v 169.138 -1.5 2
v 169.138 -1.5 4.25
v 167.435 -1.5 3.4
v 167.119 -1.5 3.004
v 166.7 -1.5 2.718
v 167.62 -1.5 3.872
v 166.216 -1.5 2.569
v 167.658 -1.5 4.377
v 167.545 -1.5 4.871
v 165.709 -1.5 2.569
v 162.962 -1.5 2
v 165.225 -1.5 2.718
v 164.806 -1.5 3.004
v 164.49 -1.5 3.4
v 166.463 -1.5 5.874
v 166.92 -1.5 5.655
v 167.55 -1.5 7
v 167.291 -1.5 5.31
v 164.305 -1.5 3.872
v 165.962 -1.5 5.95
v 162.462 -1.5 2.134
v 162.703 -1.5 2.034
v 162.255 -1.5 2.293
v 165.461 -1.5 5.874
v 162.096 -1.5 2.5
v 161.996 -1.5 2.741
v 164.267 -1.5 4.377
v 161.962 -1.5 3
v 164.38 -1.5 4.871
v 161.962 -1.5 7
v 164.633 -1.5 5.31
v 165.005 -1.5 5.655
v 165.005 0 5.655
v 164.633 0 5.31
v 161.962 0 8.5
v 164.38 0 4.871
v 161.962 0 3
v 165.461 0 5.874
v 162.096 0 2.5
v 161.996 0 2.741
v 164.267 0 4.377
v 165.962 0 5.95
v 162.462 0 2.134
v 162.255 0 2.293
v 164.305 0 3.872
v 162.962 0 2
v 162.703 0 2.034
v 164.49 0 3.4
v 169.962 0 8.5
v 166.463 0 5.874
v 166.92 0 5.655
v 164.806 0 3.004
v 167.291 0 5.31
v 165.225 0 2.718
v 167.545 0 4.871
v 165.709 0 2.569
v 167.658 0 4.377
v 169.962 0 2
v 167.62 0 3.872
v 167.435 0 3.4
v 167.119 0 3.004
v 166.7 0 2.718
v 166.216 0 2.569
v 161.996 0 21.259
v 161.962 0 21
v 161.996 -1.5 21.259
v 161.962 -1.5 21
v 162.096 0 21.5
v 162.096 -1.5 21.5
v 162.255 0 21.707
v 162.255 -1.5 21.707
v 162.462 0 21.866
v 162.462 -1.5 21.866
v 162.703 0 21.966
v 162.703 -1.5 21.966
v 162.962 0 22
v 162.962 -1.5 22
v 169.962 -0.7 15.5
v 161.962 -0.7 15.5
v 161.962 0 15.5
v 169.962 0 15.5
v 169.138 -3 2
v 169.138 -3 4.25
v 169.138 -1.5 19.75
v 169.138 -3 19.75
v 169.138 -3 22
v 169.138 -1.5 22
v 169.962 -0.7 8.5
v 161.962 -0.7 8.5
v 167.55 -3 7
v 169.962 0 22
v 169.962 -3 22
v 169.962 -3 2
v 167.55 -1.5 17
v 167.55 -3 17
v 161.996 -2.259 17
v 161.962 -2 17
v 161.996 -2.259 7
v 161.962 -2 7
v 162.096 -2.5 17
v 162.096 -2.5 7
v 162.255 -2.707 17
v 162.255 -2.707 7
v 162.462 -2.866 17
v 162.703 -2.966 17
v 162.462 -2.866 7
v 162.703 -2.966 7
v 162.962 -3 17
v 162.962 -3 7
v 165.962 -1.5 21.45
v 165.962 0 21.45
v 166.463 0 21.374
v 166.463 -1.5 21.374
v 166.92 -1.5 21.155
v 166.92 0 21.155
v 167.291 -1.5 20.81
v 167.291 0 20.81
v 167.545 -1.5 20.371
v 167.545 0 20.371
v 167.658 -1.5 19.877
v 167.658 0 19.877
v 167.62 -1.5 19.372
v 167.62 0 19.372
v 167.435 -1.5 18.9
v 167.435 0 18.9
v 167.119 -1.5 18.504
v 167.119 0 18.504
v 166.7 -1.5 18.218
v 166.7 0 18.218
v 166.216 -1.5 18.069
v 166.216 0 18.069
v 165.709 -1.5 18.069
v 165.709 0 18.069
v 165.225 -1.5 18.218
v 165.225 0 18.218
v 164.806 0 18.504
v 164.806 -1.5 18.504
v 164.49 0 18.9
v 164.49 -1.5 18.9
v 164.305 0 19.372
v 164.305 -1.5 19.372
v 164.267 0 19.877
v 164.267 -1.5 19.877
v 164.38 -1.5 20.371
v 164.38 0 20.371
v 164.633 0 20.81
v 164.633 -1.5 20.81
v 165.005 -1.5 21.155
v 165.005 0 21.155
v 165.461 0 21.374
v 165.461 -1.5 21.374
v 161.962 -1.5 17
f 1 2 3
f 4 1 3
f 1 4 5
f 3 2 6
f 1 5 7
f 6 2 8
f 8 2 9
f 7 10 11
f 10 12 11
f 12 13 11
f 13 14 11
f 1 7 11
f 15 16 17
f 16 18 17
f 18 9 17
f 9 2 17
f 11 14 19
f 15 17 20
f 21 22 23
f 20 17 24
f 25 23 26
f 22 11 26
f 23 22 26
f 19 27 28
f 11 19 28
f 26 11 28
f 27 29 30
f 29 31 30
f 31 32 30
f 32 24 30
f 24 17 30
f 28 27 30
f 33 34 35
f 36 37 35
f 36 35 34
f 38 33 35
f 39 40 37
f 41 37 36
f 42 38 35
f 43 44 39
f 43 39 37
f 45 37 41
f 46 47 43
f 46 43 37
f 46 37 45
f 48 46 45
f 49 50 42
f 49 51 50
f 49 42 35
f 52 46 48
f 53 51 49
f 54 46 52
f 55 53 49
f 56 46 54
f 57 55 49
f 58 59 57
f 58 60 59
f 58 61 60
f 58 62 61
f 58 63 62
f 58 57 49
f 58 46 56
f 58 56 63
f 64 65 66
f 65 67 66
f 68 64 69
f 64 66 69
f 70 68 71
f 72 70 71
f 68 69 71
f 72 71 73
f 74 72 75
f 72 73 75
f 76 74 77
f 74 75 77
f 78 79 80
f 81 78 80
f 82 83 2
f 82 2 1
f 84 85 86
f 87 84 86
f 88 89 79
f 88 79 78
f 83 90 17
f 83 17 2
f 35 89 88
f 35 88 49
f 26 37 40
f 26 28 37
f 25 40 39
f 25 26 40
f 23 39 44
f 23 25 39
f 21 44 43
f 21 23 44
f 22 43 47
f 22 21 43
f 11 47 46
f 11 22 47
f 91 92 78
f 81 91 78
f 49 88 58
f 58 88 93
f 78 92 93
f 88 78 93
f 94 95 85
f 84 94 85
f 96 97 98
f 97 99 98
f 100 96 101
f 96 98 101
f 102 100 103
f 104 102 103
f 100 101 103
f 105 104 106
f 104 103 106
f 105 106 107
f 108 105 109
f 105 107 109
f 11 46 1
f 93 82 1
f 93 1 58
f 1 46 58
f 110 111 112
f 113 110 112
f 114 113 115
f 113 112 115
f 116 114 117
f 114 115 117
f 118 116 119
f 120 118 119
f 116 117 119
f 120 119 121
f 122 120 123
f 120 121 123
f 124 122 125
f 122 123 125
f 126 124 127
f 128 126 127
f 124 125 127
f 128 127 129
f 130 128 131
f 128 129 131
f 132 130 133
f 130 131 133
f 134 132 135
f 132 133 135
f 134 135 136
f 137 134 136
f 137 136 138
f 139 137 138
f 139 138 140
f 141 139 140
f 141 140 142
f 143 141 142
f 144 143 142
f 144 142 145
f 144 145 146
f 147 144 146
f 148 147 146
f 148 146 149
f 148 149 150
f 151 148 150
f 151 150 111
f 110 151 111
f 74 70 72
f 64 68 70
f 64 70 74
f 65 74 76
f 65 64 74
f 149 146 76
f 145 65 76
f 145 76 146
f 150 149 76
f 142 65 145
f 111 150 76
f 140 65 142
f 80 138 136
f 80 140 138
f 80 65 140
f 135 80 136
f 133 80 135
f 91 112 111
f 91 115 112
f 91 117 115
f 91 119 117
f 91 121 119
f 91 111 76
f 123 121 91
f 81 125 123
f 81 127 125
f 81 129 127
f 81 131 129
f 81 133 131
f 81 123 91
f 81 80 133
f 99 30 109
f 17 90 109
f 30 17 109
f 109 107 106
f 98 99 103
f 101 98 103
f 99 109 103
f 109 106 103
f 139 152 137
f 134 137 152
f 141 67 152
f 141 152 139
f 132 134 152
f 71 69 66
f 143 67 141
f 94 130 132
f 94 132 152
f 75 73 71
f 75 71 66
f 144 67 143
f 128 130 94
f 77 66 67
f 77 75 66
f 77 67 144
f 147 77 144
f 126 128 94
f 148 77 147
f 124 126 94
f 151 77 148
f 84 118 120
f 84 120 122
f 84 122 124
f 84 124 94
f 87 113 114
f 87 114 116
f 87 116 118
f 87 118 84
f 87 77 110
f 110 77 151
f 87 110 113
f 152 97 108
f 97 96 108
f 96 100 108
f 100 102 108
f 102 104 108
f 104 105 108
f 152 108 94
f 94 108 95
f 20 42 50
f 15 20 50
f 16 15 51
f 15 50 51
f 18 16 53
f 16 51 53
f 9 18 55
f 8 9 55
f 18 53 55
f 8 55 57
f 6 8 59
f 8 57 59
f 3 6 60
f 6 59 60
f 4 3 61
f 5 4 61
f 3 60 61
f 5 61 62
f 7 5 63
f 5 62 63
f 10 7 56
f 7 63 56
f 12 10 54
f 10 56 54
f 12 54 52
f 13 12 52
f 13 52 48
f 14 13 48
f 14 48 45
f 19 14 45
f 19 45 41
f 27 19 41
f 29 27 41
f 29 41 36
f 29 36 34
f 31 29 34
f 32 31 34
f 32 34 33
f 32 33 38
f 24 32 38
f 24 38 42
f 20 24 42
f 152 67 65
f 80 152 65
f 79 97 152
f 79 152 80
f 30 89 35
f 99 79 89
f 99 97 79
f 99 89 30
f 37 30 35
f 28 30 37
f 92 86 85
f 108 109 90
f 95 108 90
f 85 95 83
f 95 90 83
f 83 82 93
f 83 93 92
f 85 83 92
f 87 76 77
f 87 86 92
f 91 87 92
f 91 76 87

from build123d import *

# Parameters (mm, degrees)
CROQUIS1_W              = 8
CROQUIS1_H              = 20
CROQUIS1_R              = 1.7
SALIENTE_EXTRUIR1_DEPTH = 3
CORTAR_EXTRUIR2_DEPTH   = 1.5
CORTAR_EXTRUIR3_REACH   = 25.601
CROQUIS3_W              = 7
CROQUIS3_H              = 1
REDONDEO1_R             = 1
CROQUIS4_W              = 8
CROQUIS4_H              = 7
SALIENTE_EXTRUIR2_DEPTH = 0.3


with BuildPart() as part:
    # Croquis1 → Saliente-Extruir1 (new body)
    with BuildSketch(Plane(origin=(0, 0, 0), x_dir=(1, 0, 0), z_dir=(0, 1, 0))):
        with Locations((165.962302832, -11.999998776)):
            Rectangle(CROQUIS1_W, CROQUIS1_H)
        with Locations(Location((165.962302832, -4.249998776, 0), (0, 0, 270))):
            Circle(CROQUIS1_R, mode=Mode.SUBTRACT)
        with Locations(Location((165.962302832, -19.75, 0), (0, 0, 270))):
            Circle(CROQUIS1_R, mode=Mode.SUBTRACT)
    extrude(amount=-SALIENTE_EXTRUIR1_DEPTH)

    # Croquis2 → Cortar-Extruir2 (cut)
    with BuildSketch(Plane.XZ.offset(3)):
        Polygon((164.374589592, 17), (167.550016072, 17), (169.137729313, 19.75), (169.137729313, 21.999998776), (161.962302832, 21.999998776), (161.962302832, 17), align=None)
        Polygon((161.962302832, 6.999997552), (164.374589592, 6.999997552), (167.550016072, 6.999997552), (169.137729313, 4.249997552), (169.137729313, 1.999998776), (161.962302832, 1.999998776), align=None)
    extrude(amount=-CORTAR_EXTRUIR2_DEPTH, mode=Mode.SUBTRACT)

    # Croquis3 → Cortar-Extruir3 (cut, up to next)
    with BuildSketch(Plane.ZY.offset(-161.962302832), mode=Mode.PRIVATE) as cortar_extruir3_sk1:
        with Locations((11.999998776, -0.5)):
            Rectangle(CROQUIS3_W, CROQUIS3_H)
    cortar_extruir3_tool1 = extrude(cortar_extruir3_sk1.sketch, amount=-CORTAR_EXTRUIR3_REACH, mode=Mode.PRIVATE) & part.part
    add(cortar_extruir3_tool1.solids().sort_by_distance((161.962303, -0.5, 11.999999))[0], mode=Mode.SUBTRACT)

    # Redondeo1
    redondeo1_edges = [part.edges().sort_by_distance(p)[0] for p in [
        (161.962302832, -0.75, 21.999998776),
        (161.962302832, -3, 11.999998776),
        (161.962302832, -0.75, 1.999998776),
    ]]
    fillet(redondeo1_edges, radius=REDONDEO1_R)

    # Croquis4 → Saliente-Extruir2 (add)
    with BuildSketch(Plane(origin=(0, -1, 0), x_dir=(1, 0, 0), z_dir=(0, 1, 0))):
        with Locations((165.962302832, -11.999998776)):
            Rectangle(CROQUIS4_W, CROQUIS4_H)
    extrude(amount=SALIENTE_EXTRUIR2_DEPTH)


solid = part.part
